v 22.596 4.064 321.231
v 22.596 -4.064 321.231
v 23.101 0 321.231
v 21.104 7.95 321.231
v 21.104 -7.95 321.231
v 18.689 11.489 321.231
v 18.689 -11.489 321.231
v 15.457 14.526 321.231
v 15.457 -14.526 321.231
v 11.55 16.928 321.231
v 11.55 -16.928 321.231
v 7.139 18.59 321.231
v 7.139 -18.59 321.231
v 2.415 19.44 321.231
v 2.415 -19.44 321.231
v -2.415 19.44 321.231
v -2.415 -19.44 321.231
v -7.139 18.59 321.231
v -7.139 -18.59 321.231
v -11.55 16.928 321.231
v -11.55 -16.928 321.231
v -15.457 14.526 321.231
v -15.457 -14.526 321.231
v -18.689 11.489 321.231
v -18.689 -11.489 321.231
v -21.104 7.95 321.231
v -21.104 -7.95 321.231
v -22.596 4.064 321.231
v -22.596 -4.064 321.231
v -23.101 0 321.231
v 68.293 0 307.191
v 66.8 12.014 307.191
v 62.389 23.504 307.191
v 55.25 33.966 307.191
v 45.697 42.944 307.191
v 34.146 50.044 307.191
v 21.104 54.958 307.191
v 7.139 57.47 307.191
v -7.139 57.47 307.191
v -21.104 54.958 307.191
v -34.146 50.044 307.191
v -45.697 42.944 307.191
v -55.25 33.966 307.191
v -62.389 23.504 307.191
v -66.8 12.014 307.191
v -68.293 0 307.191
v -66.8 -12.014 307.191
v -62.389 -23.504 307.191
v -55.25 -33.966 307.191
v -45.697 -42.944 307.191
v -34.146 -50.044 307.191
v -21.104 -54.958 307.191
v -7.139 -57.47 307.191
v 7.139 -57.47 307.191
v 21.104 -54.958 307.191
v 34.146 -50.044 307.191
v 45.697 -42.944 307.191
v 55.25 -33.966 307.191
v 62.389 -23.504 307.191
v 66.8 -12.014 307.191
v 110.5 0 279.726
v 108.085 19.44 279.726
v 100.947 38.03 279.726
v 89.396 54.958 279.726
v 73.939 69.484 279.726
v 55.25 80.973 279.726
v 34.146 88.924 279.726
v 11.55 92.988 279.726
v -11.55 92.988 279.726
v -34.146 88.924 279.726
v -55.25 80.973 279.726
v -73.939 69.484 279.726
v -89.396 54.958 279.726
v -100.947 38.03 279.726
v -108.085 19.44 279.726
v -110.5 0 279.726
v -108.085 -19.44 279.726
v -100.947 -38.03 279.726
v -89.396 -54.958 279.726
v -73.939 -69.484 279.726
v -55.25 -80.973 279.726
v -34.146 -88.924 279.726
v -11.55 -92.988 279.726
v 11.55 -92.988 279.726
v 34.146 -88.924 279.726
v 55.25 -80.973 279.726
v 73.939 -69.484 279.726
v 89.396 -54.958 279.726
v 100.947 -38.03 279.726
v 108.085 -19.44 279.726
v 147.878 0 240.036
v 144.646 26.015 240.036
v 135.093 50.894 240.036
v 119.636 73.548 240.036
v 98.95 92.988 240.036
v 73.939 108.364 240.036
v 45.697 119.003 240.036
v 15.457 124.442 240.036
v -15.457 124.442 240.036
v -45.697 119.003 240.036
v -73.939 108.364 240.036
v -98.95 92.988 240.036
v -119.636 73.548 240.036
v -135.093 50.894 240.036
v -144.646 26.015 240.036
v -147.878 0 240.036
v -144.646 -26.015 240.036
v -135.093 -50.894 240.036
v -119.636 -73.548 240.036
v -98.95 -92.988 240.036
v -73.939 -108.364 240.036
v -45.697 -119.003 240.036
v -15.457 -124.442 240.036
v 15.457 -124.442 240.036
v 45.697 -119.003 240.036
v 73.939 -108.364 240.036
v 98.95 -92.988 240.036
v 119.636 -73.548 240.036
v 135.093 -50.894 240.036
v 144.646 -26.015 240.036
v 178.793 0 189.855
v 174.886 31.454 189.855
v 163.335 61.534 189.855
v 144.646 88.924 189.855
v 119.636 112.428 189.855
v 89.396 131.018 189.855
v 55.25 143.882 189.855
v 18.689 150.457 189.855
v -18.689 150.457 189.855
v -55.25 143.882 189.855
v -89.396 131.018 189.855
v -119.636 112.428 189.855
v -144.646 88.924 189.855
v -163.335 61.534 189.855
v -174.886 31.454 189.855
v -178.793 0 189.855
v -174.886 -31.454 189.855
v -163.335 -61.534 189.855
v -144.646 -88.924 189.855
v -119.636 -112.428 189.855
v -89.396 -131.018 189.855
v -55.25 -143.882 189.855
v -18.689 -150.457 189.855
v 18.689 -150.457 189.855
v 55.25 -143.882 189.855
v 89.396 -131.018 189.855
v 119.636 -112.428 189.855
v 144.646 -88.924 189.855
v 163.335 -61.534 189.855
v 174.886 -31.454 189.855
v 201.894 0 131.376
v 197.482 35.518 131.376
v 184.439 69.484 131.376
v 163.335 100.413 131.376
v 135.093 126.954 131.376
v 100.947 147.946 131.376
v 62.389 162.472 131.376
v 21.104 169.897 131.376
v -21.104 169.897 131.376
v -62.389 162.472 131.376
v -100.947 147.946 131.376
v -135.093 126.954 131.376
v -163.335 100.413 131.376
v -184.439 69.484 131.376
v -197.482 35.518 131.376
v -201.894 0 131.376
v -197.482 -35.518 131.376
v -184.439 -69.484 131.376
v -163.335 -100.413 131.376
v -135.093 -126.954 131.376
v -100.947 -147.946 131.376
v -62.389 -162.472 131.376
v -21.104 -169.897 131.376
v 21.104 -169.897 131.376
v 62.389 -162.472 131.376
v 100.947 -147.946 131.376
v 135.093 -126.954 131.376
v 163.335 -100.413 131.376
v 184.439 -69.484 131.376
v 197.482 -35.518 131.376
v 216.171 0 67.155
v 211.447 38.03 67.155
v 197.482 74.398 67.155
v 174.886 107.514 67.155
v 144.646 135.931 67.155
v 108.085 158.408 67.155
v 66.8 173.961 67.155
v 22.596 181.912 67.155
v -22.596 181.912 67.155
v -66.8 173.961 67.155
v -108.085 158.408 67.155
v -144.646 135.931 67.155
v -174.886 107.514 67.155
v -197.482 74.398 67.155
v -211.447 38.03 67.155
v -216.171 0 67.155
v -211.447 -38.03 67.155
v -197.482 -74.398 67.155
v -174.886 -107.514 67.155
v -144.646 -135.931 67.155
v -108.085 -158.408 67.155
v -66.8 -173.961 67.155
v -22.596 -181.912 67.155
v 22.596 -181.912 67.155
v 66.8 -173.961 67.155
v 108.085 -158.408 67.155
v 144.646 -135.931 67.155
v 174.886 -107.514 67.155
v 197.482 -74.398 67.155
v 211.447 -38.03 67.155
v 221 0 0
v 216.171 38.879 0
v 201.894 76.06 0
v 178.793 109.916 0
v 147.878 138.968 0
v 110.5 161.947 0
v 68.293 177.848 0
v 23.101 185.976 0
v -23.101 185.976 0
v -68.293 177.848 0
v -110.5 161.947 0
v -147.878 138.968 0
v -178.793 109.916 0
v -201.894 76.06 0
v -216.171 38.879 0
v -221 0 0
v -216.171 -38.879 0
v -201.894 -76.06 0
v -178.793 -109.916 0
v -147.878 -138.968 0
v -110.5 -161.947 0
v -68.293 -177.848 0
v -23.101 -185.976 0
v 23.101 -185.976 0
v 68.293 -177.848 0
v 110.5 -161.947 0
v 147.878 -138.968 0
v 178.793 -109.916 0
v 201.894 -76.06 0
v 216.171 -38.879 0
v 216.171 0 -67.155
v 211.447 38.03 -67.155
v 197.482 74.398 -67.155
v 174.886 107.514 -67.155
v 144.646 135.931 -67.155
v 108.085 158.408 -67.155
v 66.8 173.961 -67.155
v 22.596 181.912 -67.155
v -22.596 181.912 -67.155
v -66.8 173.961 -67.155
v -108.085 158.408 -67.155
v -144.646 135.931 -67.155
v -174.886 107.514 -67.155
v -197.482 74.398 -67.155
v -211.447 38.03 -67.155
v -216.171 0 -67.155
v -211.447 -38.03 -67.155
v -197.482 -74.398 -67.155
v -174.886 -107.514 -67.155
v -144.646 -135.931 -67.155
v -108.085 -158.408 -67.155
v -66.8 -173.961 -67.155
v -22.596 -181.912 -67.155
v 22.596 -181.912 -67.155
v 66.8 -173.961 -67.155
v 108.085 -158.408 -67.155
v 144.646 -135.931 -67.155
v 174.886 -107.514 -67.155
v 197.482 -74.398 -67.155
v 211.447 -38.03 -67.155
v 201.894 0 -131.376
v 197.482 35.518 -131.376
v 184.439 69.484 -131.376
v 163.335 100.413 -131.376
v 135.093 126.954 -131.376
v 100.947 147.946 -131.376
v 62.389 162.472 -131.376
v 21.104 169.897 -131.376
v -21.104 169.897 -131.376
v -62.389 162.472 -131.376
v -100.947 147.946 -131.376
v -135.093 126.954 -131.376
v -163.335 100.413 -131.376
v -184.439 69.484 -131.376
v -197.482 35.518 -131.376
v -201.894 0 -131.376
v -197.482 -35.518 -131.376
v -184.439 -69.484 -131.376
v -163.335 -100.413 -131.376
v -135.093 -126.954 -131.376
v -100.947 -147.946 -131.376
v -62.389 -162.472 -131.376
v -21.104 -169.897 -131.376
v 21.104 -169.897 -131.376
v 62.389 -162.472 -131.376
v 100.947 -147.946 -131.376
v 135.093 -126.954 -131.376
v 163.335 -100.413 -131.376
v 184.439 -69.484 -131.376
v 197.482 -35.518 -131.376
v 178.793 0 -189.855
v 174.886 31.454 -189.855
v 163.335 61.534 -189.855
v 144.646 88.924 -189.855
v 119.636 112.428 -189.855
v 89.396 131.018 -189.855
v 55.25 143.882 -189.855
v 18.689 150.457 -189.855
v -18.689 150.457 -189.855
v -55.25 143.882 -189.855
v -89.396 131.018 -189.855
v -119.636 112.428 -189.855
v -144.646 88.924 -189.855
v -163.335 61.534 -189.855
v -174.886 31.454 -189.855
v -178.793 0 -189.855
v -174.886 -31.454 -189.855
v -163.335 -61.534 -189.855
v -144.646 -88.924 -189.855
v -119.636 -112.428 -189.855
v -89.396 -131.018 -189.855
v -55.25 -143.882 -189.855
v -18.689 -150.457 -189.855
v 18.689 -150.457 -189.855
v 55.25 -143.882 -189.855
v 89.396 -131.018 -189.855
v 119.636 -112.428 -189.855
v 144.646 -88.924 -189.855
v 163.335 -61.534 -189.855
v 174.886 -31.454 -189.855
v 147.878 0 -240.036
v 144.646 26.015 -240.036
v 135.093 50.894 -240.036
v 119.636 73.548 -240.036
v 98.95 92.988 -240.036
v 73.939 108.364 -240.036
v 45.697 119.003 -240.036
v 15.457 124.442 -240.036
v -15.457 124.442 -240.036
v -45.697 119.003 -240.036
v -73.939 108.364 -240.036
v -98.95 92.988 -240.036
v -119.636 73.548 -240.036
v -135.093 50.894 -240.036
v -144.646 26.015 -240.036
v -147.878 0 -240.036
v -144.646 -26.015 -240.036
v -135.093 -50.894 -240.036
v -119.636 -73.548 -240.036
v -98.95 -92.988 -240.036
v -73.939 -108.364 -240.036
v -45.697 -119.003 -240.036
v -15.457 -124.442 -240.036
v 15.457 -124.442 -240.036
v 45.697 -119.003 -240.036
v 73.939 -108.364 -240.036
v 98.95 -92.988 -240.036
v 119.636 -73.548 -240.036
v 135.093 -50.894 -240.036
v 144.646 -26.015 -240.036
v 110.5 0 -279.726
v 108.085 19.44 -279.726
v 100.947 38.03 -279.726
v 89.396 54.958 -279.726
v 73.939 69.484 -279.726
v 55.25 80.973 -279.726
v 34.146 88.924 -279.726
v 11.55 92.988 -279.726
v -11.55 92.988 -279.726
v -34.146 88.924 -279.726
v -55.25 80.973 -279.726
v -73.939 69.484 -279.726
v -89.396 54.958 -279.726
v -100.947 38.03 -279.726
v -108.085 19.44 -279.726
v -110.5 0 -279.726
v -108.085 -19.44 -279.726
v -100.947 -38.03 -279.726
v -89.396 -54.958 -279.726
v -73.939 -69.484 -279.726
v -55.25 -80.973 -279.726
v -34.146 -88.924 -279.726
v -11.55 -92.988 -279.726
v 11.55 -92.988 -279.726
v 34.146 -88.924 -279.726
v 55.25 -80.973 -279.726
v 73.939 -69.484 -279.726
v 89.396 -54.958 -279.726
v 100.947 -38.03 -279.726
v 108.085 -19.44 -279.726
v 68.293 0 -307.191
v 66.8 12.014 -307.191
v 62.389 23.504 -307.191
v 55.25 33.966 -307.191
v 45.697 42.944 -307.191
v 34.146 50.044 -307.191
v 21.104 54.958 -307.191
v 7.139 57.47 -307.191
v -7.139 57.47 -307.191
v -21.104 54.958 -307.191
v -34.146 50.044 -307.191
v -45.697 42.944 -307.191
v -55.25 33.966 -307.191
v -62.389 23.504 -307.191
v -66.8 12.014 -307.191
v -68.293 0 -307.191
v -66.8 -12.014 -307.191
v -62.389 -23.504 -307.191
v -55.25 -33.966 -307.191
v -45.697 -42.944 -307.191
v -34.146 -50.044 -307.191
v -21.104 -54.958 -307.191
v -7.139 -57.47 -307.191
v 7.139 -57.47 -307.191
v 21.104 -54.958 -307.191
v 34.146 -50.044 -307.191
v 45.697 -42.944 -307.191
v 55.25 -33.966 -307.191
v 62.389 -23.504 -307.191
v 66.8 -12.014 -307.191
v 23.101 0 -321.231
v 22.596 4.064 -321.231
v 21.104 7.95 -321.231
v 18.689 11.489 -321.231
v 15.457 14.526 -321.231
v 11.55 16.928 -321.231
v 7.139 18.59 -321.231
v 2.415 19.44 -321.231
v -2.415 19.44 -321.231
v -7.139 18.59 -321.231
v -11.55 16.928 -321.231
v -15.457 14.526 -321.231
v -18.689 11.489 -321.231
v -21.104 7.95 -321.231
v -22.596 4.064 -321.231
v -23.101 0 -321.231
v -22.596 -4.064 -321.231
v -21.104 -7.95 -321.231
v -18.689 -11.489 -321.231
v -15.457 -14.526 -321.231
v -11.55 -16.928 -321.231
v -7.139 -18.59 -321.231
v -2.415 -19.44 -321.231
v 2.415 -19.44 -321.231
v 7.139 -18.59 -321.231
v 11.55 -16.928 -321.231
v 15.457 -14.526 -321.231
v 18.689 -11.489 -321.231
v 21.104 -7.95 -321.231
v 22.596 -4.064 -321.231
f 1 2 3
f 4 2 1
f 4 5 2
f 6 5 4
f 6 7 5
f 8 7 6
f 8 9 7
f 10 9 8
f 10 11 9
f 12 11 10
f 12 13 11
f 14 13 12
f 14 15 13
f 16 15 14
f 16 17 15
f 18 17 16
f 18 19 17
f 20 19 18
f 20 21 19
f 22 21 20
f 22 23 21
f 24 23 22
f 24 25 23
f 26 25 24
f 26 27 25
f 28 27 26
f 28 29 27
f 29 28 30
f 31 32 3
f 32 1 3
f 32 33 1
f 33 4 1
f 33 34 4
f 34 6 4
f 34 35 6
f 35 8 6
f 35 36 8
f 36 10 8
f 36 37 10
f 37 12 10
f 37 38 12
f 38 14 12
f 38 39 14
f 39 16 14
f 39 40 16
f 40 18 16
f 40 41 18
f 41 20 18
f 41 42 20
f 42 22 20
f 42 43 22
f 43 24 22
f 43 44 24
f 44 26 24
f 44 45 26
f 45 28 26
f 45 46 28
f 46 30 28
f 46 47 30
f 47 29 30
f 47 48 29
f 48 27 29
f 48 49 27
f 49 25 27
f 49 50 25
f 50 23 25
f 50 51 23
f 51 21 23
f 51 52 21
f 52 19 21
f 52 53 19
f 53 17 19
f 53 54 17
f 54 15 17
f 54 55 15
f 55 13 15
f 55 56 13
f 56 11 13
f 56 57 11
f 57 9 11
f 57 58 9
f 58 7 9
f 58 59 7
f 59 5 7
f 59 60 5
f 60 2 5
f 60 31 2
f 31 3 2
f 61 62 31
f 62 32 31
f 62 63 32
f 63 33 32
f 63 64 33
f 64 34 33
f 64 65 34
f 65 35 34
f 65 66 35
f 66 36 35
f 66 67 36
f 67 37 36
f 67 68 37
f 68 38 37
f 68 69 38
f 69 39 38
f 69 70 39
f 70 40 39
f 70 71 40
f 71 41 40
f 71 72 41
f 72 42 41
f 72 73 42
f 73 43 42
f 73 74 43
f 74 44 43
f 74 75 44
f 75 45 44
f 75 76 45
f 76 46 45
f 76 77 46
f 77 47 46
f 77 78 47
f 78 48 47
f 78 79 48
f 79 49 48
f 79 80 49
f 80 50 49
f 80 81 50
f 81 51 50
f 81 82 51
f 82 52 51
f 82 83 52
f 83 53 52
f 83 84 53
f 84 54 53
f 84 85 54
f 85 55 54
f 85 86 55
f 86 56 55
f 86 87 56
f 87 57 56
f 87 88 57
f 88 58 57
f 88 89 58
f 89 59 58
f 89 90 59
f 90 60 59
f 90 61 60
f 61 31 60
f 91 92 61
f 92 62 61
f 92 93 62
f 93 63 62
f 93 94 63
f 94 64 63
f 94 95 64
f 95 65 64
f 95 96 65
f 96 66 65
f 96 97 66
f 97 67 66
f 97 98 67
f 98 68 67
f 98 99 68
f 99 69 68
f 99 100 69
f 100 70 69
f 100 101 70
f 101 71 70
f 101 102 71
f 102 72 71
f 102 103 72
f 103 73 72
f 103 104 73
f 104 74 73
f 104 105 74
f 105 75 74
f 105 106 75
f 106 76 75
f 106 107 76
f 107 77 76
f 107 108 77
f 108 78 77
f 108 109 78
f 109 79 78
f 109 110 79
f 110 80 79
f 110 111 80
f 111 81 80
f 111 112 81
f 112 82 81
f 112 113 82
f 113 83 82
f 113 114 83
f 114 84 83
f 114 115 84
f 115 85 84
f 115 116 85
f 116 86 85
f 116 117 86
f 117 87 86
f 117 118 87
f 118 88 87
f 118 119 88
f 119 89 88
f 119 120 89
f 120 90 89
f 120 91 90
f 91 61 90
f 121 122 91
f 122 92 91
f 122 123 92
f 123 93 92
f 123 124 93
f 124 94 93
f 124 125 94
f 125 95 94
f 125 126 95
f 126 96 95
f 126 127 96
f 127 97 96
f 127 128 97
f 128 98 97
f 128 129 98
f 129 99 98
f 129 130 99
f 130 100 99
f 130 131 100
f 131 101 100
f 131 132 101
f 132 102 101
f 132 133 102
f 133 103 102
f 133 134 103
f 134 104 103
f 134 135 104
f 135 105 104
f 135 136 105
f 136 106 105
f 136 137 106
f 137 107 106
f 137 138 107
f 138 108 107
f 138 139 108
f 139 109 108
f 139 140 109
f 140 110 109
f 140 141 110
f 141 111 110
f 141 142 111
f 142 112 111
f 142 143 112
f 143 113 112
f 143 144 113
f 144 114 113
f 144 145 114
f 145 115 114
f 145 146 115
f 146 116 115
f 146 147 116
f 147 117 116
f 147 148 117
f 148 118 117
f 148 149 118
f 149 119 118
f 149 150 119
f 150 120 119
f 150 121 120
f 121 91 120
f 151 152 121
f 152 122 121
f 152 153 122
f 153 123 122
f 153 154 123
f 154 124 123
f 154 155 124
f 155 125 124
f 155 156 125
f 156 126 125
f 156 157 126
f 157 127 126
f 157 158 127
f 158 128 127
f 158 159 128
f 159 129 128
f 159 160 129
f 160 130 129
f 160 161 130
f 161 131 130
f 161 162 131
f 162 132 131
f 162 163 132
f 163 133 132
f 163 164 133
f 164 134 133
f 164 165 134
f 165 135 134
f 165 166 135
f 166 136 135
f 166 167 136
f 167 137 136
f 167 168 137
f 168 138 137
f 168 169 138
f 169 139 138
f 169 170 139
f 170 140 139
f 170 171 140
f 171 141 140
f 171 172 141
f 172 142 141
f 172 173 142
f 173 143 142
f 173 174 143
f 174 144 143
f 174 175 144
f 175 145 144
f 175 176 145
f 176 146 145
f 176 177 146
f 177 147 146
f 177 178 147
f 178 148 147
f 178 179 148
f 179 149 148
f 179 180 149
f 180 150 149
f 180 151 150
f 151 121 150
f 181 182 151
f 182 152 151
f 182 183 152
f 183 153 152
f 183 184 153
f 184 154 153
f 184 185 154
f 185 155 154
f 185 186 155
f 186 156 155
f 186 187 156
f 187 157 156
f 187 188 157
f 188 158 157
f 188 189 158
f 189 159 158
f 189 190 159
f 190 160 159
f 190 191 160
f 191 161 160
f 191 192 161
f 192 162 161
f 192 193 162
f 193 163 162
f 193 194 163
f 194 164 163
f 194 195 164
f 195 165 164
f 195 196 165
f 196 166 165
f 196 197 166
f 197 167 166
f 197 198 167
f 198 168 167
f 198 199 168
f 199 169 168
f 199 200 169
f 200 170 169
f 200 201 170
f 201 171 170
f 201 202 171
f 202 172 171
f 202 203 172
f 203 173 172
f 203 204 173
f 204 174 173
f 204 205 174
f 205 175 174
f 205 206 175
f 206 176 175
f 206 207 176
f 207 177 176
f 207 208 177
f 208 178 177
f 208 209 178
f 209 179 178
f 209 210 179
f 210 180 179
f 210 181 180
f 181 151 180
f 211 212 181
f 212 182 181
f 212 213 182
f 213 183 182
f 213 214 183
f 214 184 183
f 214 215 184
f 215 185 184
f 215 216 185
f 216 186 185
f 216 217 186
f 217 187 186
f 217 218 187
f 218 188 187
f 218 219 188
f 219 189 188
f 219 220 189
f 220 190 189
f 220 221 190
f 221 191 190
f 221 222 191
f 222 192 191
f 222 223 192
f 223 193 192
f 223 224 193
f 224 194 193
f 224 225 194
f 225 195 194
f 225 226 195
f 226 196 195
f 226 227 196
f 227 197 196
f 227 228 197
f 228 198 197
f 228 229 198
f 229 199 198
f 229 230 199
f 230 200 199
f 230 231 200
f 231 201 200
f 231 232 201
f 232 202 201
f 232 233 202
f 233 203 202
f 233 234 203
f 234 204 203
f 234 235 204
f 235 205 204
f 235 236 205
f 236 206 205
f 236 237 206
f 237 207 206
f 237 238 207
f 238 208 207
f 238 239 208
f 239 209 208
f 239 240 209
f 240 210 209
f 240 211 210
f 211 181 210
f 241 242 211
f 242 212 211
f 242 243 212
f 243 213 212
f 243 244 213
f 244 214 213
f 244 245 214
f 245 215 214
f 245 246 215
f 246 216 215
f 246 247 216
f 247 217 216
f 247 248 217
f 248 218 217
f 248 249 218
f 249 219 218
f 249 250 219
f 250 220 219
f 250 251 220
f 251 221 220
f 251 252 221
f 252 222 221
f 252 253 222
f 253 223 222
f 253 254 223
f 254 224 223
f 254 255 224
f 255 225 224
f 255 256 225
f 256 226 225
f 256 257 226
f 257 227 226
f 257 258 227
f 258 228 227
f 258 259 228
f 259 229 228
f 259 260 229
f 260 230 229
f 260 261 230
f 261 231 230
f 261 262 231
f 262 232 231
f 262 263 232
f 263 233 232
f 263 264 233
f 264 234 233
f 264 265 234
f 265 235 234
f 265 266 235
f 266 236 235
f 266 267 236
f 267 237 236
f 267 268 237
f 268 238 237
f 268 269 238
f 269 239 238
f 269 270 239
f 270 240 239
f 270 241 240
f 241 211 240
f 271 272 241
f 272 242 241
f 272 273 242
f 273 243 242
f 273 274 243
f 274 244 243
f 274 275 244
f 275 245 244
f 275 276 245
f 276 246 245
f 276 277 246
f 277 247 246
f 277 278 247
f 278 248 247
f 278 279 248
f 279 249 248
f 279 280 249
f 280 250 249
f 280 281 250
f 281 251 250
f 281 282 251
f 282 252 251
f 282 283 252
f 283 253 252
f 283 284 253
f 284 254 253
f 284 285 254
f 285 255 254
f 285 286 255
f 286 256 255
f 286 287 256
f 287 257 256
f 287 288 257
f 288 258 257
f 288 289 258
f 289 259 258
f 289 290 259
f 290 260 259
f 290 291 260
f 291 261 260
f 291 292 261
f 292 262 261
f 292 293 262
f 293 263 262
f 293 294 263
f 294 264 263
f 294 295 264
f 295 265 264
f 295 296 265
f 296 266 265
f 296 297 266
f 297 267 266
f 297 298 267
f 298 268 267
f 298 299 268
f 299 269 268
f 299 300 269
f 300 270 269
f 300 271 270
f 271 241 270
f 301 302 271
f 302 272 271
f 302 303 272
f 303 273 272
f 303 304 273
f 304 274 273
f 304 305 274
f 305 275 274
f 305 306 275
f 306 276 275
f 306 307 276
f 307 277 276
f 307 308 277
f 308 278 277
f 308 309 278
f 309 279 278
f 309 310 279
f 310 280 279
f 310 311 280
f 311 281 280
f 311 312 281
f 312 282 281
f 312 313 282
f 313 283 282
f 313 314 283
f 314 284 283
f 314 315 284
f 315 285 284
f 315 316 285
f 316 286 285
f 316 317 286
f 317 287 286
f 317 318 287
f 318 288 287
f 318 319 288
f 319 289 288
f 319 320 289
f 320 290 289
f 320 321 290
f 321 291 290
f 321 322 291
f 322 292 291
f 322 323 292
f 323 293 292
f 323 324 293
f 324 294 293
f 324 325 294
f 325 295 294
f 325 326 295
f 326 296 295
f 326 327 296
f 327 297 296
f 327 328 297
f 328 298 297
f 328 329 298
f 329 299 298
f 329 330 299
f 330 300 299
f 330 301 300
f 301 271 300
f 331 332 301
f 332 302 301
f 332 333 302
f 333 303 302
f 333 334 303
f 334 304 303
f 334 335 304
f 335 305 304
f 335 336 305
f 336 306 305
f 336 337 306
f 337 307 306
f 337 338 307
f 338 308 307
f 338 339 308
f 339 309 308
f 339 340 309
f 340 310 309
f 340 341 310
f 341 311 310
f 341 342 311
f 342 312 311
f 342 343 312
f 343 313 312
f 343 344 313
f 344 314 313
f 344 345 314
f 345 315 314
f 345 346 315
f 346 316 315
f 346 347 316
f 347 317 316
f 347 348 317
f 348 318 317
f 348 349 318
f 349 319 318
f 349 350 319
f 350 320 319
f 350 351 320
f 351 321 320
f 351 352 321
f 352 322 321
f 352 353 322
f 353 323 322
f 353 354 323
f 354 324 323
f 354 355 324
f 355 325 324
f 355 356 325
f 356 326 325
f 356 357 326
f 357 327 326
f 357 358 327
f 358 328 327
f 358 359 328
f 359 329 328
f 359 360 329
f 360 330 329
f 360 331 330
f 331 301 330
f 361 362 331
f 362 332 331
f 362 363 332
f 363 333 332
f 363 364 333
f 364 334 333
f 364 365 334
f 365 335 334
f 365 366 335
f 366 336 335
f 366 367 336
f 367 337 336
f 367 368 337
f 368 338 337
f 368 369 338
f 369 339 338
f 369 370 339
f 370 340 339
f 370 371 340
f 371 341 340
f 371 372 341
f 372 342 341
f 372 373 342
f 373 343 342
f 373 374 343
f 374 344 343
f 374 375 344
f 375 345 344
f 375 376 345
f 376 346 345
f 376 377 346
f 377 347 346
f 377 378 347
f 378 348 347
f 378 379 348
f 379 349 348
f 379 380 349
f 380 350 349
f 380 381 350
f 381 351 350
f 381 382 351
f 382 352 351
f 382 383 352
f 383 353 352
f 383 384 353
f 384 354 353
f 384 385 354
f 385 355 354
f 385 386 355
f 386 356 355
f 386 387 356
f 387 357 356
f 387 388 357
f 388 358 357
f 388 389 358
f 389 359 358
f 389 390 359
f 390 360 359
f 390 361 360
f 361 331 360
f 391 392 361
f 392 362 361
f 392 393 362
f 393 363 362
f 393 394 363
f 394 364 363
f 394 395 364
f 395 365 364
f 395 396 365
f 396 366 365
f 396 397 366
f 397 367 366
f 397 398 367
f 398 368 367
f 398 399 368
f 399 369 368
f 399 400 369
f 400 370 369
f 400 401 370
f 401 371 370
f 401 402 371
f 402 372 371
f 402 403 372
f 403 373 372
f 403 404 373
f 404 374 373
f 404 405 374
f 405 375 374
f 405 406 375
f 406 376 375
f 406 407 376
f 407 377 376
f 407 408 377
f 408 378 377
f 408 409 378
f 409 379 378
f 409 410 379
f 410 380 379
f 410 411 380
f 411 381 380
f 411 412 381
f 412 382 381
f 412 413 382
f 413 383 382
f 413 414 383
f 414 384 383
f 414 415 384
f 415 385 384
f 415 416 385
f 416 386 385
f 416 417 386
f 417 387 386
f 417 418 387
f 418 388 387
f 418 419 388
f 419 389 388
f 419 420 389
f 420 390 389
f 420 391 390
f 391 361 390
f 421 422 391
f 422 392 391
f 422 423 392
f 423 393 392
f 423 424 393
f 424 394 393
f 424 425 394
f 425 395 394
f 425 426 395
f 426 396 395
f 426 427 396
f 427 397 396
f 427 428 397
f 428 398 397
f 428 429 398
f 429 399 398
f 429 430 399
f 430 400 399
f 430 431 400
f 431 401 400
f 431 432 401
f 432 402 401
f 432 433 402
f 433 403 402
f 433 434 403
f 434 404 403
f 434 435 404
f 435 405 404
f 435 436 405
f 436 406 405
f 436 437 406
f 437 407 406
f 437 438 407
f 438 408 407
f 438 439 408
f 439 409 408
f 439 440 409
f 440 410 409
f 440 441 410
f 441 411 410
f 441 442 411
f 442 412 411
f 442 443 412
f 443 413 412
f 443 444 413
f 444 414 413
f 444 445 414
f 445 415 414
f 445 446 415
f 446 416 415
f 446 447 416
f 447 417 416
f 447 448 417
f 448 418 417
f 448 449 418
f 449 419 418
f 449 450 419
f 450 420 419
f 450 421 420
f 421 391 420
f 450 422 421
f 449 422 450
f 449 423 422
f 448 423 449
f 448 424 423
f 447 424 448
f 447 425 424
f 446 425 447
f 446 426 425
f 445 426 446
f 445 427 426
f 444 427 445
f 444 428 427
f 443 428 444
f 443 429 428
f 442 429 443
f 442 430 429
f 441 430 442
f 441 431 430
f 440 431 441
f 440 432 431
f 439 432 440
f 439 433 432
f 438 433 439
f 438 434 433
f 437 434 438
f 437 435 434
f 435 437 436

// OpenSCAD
// Generated by SolidPython 1.0.1 on 2020-07-29 00:46:51


scale(v = [13, 11, 19]) {
	sphere(r = 17);
}
/***********************************************
*********      SolidPython code:      **********
************************************************
 
# import packages: SolidPython
from solid import *
from solid.utils import *
from itertools import chain, combinations, permutations


class Resize:

    def __init__(self, scad_file):
        self.scad_file = scad_file
        #self.scad_file = import_scad(scad_file)
        # cone/cylinder param:
        self.r1 = 0
        self.r2 = 0
        self.h = 0
        # rectangular prism param:
        self.w = 0
        self.l = 0
        # ellipse param:
        self.r = 0

    # import OpenScad code (file name corresponds to shape)


    # classify shape + parameters
    def assign(self, param1, param2, param3):
        if self.scad_file == 'cone.scad':
            self.r1 = param1
            self.r2 = param2
            self.h = param3
        elif self.scad_file == 'cylinder.scad':
            self.r1 = param1
            self.r2 = param2
            self.h = param3
        elif self.scad_file == 'rectangularPrism.scad':
            self.h = param1
            self.l = param2
            self.w = param3
        else:
            self.r = param1
            self.h = param2

    # resize parameters
    def iterate(self):
        x = range(3, 20, 2)
        i = 1
        if self.scad_file == 'cone.scad':
            tempList = list(permutations(x, 2))
            for temp in tempList:
                param1 = temp[0]
                param2 = temp[1]
                filepath = 'produced_scad_files/' + 'cone' + str(param1) + '_' + str(param2) + '_' + '.scad'
                scad_render_to_file(cylinder(h=param1, r1=param2, r2=0), filepath)

        elif self.scad_file == 'cylinder.scad':
            tempList = list(permutations(x, 3))
            for temp in tempList:
                param1 = temp[0]
                param2 = temp[1]
                filepath = 'produced_scad_files/' + 'cylinder' + str(param1) + '_' + str(param2) + '_' + '.scad'
                scad_render_to_file(cylinder(h=param1, r1=param2, r2=param2), filepath)

        elif self.scad_file == 'rectangularPrism.scad':
            tempList = list(permutations(x, 3))
            for temp in tempList:
                param1 = temp[0]
                param2 = temp[1]
                param3 = temp[2]
                filepath = 'produced_scad_files/' + 'rectangularPrism' + str(param1) + '_' + str(param2) + '_' + str(
                    param3) + '.scad'
                scad_render_to_file(cube(size=(param1, param2, param3)), filepath)

        elif self.scad_file == 'ellipse.scad':
            tempList = list(permutations(x, 4))
            for temp in tempList:
                param1 = temp[0]
                param2 = temp[1]
                param3 = temp[2]
                param4 = temp[3]
                filepath = 'produced_scad_files/' + 'ellipse' + str(param1) + '_' + str(param2) + '_' + str(param3) + '_' + str(param4) + '.scad'
                scad_render_to_file(scale([param1, param2, param3])(sphere(r=param4)), filepath)

    def render_to_scadfile(self):
        scad_render_to_file(scad, 'example.scad') 
 
************************************************/
